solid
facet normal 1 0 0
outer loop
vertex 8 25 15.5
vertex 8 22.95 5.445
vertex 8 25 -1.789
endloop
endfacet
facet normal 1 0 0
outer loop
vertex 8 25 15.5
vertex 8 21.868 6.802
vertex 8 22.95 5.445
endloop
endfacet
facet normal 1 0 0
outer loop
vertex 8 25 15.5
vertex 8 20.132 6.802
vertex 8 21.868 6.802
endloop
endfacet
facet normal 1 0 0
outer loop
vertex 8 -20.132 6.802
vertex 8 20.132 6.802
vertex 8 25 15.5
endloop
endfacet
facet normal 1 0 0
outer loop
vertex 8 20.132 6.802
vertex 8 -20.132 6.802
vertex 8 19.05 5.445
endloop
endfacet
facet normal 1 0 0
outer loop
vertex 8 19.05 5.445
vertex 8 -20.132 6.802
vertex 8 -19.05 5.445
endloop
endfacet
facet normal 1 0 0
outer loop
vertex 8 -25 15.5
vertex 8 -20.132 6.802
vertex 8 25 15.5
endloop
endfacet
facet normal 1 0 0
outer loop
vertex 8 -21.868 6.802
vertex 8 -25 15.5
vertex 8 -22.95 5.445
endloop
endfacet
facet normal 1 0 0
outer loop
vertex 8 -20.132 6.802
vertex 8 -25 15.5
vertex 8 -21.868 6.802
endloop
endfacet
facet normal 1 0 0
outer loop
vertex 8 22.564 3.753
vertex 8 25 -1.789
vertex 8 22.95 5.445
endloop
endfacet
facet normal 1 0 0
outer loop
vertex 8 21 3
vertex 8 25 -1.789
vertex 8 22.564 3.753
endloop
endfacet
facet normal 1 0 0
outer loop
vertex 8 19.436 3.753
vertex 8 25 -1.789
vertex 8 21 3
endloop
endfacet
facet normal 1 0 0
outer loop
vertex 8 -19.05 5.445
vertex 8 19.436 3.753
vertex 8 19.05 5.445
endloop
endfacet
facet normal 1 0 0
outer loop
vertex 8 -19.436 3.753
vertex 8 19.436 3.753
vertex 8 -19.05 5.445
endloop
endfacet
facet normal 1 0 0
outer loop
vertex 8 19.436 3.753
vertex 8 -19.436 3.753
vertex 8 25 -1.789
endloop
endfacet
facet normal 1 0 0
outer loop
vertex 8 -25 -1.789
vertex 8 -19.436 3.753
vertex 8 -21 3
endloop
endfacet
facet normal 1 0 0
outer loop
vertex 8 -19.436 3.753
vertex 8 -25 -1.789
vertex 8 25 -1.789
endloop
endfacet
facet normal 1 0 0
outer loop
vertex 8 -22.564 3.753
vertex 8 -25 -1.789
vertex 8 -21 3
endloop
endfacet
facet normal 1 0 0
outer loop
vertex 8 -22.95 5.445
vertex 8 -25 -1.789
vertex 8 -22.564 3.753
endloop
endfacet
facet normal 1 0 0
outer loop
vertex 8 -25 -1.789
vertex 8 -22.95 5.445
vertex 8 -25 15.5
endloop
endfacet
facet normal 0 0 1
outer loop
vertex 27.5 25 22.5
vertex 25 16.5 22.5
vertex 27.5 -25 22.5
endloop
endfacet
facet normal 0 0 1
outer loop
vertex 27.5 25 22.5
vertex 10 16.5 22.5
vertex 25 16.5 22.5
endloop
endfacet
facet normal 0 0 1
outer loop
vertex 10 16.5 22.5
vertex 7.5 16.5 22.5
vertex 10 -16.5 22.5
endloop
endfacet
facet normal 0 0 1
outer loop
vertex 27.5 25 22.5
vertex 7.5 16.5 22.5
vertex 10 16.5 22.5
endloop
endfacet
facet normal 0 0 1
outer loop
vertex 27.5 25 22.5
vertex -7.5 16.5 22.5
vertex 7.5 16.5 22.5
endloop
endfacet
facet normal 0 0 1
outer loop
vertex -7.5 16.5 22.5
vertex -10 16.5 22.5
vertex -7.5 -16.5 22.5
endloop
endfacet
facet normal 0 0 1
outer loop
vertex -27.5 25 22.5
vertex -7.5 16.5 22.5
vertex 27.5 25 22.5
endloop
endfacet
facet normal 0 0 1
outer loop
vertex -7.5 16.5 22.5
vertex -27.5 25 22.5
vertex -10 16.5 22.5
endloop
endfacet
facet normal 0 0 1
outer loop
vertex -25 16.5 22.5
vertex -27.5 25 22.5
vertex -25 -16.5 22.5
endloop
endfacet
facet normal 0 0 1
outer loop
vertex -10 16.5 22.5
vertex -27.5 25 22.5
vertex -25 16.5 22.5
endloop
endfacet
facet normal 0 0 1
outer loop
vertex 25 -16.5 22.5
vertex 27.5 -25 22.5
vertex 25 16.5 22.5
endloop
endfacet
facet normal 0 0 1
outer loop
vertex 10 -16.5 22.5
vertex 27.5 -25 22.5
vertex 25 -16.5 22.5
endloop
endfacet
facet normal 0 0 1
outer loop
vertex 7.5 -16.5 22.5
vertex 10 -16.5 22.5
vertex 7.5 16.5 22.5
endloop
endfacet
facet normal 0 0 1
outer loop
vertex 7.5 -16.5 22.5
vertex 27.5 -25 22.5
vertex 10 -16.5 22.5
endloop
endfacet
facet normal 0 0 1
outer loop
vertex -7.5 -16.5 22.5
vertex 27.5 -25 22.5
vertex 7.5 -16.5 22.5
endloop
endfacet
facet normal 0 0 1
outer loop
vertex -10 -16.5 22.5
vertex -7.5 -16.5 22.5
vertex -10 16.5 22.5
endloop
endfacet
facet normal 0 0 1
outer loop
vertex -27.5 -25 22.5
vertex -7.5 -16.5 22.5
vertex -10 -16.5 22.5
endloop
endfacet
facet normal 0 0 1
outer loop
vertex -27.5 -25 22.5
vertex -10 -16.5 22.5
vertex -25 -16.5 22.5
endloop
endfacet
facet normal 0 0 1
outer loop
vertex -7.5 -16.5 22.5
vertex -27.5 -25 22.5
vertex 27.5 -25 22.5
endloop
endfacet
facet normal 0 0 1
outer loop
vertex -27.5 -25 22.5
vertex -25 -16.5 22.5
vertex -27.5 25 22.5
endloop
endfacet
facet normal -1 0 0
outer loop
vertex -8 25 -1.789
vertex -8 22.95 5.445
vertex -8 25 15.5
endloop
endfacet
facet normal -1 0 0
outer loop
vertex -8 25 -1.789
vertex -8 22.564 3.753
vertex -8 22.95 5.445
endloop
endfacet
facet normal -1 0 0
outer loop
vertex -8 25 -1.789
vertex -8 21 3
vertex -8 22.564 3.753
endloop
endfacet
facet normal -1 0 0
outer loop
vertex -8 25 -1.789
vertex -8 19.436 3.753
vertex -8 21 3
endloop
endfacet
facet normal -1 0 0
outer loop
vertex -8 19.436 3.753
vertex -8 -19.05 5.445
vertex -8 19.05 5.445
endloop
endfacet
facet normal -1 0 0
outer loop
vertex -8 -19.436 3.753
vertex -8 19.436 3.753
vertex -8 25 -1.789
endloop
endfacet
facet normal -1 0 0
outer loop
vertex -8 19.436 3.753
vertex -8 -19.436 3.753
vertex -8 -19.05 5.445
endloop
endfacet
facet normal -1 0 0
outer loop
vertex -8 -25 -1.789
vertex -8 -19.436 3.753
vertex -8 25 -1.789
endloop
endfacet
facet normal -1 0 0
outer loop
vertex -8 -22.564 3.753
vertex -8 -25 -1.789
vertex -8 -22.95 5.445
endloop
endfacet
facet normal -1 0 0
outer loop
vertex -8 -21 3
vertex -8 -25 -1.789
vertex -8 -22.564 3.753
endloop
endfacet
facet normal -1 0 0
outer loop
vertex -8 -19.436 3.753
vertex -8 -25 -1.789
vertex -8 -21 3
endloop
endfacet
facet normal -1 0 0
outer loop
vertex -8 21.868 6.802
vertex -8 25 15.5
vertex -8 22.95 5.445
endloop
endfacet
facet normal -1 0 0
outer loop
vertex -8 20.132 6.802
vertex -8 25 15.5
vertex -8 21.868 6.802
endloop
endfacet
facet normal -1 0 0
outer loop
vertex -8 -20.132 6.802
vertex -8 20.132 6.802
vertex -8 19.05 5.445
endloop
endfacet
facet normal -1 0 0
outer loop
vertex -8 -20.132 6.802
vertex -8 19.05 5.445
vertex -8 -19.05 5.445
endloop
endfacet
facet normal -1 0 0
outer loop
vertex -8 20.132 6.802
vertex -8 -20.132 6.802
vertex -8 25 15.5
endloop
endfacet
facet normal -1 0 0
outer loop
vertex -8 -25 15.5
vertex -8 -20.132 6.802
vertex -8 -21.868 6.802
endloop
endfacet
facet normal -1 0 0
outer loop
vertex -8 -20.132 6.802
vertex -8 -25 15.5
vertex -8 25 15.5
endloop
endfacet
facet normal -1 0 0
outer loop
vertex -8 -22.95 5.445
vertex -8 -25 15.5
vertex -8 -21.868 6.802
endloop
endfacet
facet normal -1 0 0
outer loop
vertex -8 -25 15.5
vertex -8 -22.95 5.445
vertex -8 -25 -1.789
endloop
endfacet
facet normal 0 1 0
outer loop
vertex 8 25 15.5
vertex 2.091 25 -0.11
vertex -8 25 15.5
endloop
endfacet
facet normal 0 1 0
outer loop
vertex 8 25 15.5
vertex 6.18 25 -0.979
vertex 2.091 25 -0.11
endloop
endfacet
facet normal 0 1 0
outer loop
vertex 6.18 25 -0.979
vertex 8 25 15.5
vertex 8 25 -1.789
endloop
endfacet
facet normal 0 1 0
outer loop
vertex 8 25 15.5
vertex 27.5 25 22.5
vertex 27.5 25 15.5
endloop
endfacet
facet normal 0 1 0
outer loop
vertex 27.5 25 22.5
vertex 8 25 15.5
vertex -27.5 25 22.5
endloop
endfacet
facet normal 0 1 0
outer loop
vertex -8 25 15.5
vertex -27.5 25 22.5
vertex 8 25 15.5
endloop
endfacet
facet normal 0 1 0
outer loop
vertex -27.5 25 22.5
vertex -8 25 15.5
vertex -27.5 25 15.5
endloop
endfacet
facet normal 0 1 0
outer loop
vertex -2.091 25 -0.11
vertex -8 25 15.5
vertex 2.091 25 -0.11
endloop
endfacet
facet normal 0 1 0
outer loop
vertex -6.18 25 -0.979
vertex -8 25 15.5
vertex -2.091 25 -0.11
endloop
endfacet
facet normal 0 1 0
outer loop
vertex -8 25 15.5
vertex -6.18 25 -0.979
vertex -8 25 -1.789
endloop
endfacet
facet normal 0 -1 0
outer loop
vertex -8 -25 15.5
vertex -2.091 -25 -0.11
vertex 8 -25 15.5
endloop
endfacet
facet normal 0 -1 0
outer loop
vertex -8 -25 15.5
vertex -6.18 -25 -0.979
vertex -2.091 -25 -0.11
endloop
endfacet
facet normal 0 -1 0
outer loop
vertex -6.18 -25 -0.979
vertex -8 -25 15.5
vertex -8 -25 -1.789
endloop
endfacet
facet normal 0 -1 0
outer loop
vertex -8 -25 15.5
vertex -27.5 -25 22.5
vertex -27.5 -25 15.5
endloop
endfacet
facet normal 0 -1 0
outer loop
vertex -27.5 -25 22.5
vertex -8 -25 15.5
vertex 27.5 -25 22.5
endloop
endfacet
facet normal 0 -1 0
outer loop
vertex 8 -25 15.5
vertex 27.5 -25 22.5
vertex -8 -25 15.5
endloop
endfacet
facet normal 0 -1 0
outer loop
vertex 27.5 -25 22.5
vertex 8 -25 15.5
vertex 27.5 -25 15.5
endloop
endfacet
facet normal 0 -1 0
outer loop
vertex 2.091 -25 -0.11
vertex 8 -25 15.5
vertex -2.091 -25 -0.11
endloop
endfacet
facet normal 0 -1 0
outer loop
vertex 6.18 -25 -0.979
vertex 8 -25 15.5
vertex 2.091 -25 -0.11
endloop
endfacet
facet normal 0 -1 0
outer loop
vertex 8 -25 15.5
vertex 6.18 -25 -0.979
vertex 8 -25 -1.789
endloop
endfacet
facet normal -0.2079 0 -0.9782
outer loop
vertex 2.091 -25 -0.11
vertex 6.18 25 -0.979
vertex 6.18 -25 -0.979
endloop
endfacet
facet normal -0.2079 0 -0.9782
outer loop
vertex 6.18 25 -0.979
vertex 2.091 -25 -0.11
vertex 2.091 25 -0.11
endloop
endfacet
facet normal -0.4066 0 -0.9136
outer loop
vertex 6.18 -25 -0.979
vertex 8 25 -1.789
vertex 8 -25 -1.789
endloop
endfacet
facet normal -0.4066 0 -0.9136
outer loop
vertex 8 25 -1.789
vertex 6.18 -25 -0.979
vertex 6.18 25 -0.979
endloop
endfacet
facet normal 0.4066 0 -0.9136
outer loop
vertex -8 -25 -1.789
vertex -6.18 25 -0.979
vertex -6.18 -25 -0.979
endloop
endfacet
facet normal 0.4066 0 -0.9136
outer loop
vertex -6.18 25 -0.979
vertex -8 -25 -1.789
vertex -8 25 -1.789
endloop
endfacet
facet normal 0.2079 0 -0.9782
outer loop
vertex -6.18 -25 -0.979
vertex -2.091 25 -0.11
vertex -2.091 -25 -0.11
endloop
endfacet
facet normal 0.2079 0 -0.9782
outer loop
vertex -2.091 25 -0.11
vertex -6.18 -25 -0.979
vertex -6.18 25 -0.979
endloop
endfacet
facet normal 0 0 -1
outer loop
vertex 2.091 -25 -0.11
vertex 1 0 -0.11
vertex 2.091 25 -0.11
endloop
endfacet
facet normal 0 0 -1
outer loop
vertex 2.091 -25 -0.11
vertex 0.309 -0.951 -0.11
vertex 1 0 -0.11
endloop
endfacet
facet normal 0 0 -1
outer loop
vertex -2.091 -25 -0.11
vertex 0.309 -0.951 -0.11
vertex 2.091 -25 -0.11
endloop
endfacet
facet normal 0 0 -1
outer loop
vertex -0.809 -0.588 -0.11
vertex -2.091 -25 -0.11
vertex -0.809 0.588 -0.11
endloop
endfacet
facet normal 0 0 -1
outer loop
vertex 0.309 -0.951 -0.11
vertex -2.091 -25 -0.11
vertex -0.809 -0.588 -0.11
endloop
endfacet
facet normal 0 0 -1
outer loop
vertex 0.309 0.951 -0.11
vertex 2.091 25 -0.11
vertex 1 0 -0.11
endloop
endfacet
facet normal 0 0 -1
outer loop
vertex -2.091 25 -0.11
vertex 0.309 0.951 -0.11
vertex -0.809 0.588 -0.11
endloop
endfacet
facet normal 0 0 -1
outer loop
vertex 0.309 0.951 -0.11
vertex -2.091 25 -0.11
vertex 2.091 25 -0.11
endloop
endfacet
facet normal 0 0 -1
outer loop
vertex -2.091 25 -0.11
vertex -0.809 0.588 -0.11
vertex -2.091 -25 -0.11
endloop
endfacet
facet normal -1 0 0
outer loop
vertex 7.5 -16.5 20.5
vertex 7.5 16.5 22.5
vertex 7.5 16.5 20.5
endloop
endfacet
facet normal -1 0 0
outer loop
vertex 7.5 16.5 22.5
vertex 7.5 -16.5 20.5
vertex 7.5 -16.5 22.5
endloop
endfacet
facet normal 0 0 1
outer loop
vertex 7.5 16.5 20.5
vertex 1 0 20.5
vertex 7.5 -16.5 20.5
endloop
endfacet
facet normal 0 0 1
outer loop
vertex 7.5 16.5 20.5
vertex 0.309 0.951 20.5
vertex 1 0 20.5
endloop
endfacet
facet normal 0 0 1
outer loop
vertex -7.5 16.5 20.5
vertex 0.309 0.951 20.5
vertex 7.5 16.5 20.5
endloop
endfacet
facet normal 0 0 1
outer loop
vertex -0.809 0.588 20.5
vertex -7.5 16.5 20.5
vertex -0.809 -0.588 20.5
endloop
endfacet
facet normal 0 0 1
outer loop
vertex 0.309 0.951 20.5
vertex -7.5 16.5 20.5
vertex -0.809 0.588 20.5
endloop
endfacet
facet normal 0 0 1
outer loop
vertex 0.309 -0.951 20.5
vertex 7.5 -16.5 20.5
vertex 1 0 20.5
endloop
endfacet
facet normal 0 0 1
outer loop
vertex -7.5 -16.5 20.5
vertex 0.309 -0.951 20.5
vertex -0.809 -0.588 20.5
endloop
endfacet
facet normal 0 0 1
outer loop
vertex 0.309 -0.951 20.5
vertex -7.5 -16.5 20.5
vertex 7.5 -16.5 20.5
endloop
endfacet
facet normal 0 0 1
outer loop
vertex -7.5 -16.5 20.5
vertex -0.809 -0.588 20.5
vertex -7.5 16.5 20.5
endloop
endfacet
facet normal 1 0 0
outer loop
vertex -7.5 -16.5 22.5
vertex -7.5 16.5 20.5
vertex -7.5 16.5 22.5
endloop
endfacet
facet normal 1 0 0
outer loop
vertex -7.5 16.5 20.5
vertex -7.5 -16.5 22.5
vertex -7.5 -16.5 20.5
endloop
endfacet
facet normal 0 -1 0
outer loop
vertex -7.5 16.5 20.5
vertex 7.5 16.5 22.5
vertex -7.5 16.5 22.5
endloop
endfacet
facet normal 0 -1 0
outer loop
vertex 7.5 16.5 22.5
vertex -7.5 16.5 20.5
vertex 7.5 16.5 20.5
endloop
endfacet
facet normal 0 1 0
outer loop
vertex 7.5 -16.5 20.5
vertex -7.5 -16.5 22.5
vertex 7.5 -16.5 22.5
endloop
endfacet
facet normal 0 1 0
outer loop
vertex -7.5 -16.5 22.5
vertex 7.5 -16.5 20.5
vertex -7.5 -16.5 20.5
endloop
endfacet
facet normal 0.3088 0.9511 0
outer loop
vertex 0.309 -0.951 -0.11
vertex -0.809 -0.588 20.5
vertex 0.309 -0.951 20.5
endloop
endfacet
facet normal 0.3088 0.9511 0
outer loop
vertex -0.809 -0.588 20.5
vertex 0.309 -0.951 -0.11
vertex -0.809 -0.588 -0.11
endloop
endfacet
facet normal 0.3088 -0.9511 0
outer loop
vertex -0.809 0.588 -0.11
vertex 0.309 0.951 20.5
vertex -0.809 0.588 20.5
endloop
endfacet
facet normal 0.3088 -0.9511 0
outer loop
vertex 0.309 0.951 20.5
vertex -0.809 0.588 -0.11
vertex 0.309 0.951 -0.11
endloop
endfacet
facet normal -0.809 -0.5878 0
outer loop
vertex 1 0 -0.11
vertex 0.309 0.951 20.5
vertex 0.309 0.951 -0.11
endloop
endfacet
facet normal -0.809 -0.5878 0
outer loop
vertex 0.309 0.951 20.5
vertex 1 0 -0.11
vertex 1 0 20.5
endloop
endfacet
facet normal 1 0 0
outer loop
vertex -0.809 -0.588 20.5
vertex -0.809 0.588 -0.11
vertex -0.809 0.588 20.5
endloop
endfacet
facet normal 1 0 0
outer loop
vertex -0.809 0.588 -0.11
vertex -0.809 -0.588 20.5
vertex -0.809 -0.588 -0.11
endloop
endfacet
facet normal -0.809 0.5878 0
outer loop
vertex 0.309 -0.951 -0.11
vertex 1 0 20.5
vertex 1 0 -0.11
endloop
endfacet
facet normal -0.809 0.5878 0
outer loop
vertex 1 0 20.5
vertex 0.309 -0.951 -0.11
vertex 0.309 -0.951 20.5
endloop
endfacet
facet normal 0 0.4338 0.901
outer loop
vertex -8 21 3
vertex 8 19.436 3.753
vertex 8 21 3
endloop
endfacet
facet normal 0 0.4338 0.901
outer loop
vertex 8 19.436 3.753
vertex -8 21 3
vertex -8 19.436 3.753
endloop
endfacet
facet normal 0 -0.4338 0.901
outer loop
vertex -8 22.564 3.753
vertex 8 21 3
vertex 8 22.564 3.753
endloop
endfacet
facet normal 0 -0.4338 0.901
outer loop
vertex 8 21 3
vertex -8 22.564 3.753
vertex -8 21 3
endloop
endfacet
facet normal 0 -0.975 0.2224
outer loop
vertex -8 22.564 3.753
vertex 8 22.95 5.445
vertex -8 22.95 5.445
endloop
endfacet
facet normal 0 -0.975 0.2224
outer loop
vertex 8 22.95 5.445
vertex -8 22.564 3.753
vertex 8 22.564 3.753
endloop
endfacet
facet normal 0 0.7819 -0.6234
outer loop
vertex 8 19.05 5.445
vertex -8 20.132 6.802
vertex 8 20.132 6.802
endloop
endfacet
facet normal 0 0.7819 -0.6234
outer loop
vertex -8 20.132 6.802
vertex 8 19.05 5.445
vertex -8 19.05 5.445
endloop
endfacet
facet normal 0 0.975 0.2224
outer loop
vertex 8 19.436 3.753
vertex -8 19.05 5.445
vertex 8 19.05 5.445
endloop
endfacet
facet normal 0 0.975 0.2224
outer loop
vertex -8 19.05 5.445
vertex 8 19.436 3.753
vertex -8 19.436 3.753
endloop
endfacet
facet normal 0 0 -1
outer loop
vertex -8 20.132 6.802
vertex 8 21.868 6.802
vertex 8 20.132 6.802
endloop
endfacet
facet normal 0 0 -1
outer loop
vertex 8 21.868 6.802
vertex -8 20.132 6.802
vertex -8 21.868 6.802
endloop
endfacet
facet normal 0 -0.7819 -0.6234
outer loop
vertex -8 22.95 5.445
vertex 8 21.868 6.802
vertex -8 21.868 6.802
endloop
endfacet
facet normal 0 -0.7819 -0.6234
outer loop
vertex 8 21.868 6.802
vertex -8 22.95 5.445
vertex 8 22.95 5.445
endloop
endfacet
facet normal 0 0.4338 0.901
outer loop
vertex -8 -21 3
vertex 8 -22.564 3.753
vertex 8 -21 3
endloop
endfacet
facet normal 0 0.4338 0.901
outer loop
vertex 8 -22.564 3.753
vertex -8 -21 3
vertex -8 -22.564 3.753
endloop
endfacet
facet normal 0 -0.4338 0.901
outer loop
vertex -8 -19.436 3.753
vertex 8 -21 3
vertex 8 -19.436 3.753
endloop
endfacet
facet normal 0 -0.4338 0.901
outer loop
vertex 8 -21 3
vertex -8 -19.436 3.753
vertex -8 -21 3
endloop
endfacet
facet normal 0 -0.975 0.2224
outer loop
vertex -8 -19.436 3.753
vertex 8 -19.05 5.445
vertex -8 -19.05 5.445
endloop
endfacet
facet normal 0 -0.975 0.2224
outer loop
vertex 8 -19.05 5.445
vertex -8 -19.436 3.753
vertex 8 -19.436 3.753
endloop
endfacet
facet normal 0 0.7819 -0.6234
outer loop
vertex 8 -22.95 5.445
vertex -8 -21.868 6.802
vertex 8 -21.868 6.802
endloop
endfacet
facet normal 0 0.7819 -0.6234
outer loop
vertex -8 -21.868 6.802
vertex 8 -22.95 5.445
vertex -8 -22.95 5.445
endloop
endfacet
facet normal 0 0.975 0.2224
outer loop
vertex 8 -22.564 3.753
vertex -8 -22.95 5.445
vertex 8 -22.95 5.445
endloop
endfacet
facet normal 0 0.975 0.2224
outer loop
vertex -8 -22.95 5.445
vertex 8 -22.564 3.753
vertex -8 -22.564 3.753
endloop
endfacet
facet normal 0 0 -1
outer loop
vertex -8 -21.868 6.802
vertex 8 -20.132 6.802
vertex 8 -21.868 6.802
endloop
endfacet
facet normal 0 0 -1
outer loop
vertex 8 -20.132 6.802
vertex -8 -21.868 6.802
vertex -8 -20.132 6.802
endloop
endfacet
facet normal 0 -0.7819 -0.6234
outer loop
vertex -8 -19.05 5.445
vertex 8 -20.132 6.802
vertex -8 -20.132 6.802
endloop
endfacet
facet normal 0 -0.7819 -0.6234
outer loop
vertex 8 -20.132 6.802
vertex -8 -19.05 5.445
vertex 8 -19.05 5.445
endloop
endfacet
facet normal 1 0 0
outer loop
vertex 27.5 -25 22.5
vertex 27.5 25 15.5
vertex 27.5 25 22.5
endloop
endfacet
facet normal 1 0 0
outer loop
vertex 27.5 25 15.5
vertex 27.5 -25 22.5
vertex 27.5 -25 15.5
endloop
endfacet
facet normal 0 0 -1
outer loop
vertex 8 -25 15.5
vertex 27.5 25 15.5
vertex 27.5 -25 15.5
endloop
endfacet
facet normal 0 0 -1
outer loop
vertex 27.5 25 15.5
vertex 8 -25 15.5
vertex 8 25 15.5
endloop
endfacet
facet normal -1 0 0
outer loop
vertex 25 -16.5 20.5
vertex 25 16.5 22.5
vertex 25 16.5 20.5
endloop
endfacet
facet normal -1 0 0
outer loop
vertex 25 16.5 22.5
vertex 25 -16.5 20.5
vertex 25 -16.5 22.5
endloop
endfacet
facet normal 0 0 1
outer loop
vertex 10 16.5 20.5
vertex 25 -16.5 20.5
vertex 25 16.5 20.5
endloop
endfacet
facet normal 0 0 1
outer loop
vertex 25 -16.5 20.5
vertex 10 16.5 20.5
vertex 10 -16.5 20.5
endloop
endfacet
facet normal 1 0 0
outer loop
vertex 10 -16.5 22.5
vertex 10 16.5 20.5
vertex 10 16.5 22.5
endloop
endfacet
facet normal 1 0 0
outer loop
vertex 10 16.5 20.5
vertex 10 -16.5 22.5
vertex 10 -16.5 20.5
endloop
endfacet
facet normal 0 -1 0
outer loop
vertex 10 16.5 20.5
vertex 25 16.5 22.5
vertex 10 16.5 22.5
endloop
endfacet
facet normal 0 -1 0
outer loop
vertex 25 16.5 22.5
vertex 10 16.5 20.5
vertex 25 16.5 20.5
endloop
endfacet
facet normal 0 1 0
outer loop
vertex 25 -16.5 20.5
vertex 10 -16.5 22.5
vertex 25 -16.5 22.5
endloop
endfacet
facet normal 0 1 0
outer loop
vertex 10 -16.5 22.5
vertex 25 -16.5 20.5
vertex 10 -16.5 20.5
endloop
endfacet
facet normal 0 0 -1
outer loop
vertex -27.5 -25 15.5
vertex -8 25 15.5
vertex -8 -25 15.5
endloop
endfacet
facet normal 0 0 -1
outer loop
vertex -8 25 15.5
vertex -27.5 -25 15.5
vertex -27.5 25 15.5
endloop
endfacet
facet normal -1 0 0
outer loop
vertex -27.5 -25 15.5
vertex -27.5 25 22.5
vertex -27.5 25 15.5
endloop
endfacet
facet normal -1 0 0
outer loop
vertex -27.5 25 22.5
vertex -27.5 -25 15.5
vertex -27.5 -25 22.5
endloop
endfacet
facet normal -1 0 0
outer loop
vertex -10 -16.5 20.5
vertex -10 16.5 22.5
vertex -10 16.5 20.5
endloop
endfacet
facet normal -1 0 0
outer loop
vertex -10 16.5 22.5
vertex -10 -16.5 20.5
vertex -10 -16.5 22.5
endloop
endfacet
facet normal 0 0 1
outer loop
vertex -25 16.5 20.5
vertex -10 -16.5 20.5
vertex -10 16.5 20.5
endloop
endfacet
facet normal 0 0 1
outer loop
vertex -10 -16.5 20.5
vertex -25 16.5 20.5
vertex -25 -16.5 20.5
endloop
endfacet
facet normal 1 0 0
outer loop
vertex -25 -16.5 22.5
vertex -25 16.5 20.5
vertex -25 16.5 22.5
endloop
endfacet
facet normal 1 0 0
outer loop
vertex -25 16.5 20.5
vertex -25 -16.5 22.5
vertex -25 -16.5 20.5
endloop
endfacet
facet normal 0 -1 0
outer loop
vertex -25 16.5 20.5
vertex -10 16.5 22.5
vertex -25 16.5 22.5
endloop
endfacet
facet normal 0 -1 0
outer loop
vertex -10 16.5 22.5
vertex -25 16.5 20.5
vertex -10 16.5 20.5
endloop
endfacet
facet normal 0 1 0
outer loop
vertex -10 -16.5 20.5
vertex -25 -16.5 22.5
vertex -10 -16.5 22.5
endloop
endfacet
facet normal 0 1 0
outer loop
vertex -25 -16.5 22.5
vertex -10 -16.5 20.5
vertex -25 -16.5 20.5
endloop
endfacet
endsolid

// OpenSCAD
grubosc = 45;
grubosc_skrzydelek = 7;
odstep = 4;

module wanna(h){
    difference(){
        cube([20,50,h],center = true);
        
        translate([0,0,h/2]){
        #cube([15, 33, 4],center=true);
        }
    }
}

module trzon(){
    difference(){
    cube([20-odstep,50,grubosc],center = true);
    
    translate([0,0,-20]){
        rotate([90,0,0]){
            #cylinder(h=60, r=20, center=true);
        }
    }
    translate([0,0,grubosc/2]){
        #cube([15, 33, 4],center=true);
    }
    
    translate([0,0,0]){
        #cylinder(h=60, d=2, center=true);
    }
    
    translate([0,21,5]){
        rotate([0,90,0]){
            #cylinder(h=60, r=2, center=true);
        }
    }
        translate([0,-21,5]){
        rotate([0,90,0]){
            #cylinder(h=60, r=2, center=true);
        }
    }
}
}

union(){
trzon();

translate([17.5,0,grubosc/2-grubosc_skrzydelek/2]){
    wanna(grubosc_skrzydelek);
}

translate([-17.5,0,grubosc/2-grubosc_skrzydelek/2]){
    wanna(grubosc_skrzydelek);
}

}
